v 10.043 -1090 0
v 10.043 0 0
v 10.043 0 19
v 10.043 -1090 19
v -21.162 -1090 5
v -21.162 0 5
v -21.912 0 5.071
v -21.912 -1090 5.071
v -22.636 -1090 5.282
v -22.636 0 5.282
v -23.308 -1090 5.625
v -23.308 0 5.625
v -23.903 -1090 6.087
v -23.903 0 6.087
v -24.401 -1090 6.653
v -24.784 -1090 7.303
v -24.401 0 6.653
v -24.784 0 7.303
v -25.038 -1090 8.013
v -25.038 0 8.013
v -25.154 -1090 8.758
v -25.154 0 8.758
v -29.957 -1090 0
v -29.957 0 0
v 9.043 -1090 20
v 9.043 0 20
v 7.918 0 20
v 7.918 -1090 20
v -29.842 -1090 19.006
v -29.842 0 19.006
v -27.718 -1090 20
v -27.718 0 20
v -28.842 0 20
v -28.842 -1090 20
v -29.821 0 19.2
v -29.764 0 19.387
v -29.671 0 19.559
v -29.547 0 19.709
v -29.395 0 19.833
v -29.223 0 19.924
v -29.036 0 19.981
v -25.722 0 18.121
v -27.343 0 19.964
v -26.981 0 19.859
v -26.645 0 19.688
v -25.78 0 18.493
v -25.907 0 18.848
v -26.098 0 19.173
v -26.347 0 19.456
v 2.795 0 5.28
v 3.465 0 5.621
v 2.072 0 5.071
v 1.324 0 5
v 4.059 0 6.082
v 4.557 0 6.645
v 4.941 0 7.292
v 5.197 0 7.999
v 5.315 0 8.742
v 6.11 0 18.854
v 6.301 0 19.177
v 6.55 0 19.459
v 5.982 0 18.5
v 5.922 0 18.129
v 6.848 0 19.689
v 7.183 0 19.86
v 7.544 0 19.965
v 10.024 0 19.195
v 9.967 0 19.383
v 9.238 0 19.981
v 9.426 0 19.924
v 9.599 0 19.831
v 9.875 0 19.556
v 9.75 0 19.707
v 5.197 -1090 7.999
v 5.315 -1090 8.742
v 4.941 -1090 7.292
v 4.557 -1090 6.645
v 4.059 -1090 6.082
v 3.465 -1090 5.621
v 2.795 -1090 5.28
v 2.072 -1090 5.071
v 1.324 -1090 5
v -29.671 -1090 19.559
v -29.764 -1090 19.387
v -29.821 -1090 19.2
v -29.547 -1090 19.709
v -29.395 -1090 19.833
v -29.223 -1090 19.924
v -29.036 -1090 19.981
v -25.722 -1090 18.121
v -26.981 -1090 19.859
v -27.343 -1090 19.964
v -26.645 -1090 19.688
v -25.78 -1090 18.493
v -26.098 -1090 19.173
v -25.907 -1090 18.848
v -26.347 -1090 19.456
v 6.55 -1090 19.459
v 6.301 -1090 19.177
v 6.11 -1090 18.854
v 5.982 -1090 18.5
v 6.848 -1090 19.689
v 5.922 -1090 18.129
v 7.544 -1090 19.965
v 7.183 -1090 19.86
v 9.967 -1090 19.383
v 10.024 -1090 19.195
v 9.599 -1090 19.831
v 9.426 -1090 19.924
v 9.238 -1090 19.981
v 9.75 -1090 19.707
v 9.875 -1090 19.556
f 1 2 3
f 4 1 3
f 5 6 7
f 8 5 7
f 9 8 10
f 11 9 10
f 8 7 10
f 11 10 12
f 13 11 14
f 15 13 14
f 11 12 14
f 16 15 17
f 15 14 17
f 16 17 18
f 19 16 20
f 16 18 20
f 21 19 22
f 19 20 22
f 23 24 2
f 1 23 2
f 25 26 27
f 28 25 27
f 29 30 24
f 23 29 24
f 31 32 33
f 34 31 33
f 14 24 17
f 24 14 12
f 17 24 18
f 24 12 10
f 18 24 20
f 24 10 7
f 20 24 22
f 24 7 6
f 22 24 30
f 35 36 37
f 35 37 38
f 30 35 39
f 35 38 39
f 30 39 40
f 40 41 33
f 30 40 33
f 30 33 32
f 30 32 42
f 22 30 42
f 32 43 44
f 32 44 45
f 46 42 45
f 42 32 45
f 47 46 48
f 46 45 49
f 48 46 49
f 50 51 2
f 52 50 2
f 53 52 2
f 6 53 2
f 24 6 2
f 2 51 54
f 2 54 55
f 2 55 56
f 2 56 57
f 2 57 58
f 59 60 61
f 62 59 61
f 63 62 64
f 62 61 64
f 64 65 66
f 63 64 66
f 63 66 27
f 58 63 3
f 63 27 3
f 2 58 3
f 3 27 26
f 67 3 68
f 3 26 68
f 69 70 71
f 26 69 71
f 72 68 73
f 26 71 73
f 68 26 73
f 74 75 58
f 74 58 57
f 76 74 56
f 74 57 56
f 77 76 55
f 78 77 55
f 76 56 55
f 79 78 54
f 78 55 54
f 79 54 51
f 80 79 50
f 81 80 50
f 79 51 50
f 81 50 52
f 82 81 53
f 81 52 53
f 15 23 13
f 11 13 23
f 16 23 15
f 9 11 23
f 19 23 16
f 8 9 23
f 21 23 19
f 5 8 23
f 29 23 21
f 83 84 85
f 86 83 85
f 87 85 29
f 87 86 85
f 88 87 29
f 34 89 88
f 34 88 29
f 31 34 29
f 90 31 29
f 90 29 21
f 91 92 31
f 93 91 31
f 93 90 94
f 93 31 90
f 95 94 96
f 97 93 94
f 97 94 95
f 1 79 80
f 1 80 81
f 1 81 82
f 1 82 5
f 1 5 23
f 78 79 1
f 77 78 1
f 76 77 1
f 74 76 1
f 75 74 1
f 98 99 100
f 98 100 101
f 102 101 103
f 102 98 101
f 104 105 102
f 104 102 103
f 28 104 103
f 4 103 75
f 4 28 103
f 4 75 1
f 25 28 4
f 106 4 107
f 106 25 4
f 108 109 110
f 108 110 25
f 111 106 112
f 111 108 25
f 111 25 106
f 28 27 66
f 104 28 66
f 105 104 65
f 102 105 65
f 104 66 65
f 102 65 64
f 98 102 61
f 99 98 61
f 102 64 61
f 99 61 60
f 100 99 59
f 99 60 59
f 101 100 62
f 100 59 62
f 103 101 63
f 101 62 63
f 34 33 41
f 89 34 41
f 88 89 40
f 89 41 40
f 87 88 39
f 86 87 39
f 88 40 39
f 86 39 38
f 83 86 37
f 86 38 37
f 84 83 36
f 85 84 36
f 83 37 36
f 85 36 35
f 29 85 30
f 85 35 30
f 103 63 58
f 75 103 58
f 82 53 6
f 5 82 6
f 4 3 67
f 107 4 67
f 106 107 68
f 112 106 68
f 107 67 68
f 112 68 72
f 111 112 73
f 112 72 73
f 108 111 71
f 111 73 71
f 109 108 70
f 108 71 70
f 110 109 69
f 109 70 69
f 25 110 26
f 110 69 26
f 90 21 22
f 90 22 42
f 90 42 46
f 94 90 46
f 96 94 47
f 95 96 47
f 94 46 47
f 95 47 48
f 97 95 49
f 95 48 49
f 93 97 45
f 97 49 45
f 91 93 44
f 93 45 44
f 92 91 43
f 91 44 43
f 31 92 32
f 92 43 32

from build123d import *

# Parameters (mm, degrees)
F1_DEPTH = 1090


with BuildPart() as f1:
    # F0 (on Front) → F1 (new body)
    with BuildSketch(Plane.XZ):
        with BuildLine():
            Line((-29.841657, 19.006058), (-29.956796, 0))
            Line((-29.956796, 0), (10.043204, 0))
            Line((10.043204, 0), (10.043204, 19))
            ThreePointArc((10.043204, 19), (9.750311, 19.707107), (9.043204, 20))
            Line((9.043204, 20), (7.918096, 20))
            ThreePointArc((7.918096, 20), (6.550256, 19.459114), (5.922262, 18.129013))
            Line((5.922262, 18.129013), (5.315472, 8.741974))
            ThreePointArc((5.315472, 8.741974), (4.059483, 6.081772), (1.323803, 5))
            Line((1.323803, 5), (-21.161531, 5))
            ThreePointArc((-21.161531, 5), (-23.903058, 6.087264), (-25.154203, 8.757985))
            Line((-25.154203, 8.757985), (-25.721741, 18.121007))
            ThreePointArc((-25.721741, 18.121007), (-26.347313, 19.456368), (-27.718077, 20))
            Line((-27.718077, 20), (-28.841675, 20))
            ThreePointArc((-28.841675, 20), (-29.546637, 19.709245), (-29.841657, 19.006058))
        make_face()
    extrude(amount=F1_DEPTH)


solid = f1.part
